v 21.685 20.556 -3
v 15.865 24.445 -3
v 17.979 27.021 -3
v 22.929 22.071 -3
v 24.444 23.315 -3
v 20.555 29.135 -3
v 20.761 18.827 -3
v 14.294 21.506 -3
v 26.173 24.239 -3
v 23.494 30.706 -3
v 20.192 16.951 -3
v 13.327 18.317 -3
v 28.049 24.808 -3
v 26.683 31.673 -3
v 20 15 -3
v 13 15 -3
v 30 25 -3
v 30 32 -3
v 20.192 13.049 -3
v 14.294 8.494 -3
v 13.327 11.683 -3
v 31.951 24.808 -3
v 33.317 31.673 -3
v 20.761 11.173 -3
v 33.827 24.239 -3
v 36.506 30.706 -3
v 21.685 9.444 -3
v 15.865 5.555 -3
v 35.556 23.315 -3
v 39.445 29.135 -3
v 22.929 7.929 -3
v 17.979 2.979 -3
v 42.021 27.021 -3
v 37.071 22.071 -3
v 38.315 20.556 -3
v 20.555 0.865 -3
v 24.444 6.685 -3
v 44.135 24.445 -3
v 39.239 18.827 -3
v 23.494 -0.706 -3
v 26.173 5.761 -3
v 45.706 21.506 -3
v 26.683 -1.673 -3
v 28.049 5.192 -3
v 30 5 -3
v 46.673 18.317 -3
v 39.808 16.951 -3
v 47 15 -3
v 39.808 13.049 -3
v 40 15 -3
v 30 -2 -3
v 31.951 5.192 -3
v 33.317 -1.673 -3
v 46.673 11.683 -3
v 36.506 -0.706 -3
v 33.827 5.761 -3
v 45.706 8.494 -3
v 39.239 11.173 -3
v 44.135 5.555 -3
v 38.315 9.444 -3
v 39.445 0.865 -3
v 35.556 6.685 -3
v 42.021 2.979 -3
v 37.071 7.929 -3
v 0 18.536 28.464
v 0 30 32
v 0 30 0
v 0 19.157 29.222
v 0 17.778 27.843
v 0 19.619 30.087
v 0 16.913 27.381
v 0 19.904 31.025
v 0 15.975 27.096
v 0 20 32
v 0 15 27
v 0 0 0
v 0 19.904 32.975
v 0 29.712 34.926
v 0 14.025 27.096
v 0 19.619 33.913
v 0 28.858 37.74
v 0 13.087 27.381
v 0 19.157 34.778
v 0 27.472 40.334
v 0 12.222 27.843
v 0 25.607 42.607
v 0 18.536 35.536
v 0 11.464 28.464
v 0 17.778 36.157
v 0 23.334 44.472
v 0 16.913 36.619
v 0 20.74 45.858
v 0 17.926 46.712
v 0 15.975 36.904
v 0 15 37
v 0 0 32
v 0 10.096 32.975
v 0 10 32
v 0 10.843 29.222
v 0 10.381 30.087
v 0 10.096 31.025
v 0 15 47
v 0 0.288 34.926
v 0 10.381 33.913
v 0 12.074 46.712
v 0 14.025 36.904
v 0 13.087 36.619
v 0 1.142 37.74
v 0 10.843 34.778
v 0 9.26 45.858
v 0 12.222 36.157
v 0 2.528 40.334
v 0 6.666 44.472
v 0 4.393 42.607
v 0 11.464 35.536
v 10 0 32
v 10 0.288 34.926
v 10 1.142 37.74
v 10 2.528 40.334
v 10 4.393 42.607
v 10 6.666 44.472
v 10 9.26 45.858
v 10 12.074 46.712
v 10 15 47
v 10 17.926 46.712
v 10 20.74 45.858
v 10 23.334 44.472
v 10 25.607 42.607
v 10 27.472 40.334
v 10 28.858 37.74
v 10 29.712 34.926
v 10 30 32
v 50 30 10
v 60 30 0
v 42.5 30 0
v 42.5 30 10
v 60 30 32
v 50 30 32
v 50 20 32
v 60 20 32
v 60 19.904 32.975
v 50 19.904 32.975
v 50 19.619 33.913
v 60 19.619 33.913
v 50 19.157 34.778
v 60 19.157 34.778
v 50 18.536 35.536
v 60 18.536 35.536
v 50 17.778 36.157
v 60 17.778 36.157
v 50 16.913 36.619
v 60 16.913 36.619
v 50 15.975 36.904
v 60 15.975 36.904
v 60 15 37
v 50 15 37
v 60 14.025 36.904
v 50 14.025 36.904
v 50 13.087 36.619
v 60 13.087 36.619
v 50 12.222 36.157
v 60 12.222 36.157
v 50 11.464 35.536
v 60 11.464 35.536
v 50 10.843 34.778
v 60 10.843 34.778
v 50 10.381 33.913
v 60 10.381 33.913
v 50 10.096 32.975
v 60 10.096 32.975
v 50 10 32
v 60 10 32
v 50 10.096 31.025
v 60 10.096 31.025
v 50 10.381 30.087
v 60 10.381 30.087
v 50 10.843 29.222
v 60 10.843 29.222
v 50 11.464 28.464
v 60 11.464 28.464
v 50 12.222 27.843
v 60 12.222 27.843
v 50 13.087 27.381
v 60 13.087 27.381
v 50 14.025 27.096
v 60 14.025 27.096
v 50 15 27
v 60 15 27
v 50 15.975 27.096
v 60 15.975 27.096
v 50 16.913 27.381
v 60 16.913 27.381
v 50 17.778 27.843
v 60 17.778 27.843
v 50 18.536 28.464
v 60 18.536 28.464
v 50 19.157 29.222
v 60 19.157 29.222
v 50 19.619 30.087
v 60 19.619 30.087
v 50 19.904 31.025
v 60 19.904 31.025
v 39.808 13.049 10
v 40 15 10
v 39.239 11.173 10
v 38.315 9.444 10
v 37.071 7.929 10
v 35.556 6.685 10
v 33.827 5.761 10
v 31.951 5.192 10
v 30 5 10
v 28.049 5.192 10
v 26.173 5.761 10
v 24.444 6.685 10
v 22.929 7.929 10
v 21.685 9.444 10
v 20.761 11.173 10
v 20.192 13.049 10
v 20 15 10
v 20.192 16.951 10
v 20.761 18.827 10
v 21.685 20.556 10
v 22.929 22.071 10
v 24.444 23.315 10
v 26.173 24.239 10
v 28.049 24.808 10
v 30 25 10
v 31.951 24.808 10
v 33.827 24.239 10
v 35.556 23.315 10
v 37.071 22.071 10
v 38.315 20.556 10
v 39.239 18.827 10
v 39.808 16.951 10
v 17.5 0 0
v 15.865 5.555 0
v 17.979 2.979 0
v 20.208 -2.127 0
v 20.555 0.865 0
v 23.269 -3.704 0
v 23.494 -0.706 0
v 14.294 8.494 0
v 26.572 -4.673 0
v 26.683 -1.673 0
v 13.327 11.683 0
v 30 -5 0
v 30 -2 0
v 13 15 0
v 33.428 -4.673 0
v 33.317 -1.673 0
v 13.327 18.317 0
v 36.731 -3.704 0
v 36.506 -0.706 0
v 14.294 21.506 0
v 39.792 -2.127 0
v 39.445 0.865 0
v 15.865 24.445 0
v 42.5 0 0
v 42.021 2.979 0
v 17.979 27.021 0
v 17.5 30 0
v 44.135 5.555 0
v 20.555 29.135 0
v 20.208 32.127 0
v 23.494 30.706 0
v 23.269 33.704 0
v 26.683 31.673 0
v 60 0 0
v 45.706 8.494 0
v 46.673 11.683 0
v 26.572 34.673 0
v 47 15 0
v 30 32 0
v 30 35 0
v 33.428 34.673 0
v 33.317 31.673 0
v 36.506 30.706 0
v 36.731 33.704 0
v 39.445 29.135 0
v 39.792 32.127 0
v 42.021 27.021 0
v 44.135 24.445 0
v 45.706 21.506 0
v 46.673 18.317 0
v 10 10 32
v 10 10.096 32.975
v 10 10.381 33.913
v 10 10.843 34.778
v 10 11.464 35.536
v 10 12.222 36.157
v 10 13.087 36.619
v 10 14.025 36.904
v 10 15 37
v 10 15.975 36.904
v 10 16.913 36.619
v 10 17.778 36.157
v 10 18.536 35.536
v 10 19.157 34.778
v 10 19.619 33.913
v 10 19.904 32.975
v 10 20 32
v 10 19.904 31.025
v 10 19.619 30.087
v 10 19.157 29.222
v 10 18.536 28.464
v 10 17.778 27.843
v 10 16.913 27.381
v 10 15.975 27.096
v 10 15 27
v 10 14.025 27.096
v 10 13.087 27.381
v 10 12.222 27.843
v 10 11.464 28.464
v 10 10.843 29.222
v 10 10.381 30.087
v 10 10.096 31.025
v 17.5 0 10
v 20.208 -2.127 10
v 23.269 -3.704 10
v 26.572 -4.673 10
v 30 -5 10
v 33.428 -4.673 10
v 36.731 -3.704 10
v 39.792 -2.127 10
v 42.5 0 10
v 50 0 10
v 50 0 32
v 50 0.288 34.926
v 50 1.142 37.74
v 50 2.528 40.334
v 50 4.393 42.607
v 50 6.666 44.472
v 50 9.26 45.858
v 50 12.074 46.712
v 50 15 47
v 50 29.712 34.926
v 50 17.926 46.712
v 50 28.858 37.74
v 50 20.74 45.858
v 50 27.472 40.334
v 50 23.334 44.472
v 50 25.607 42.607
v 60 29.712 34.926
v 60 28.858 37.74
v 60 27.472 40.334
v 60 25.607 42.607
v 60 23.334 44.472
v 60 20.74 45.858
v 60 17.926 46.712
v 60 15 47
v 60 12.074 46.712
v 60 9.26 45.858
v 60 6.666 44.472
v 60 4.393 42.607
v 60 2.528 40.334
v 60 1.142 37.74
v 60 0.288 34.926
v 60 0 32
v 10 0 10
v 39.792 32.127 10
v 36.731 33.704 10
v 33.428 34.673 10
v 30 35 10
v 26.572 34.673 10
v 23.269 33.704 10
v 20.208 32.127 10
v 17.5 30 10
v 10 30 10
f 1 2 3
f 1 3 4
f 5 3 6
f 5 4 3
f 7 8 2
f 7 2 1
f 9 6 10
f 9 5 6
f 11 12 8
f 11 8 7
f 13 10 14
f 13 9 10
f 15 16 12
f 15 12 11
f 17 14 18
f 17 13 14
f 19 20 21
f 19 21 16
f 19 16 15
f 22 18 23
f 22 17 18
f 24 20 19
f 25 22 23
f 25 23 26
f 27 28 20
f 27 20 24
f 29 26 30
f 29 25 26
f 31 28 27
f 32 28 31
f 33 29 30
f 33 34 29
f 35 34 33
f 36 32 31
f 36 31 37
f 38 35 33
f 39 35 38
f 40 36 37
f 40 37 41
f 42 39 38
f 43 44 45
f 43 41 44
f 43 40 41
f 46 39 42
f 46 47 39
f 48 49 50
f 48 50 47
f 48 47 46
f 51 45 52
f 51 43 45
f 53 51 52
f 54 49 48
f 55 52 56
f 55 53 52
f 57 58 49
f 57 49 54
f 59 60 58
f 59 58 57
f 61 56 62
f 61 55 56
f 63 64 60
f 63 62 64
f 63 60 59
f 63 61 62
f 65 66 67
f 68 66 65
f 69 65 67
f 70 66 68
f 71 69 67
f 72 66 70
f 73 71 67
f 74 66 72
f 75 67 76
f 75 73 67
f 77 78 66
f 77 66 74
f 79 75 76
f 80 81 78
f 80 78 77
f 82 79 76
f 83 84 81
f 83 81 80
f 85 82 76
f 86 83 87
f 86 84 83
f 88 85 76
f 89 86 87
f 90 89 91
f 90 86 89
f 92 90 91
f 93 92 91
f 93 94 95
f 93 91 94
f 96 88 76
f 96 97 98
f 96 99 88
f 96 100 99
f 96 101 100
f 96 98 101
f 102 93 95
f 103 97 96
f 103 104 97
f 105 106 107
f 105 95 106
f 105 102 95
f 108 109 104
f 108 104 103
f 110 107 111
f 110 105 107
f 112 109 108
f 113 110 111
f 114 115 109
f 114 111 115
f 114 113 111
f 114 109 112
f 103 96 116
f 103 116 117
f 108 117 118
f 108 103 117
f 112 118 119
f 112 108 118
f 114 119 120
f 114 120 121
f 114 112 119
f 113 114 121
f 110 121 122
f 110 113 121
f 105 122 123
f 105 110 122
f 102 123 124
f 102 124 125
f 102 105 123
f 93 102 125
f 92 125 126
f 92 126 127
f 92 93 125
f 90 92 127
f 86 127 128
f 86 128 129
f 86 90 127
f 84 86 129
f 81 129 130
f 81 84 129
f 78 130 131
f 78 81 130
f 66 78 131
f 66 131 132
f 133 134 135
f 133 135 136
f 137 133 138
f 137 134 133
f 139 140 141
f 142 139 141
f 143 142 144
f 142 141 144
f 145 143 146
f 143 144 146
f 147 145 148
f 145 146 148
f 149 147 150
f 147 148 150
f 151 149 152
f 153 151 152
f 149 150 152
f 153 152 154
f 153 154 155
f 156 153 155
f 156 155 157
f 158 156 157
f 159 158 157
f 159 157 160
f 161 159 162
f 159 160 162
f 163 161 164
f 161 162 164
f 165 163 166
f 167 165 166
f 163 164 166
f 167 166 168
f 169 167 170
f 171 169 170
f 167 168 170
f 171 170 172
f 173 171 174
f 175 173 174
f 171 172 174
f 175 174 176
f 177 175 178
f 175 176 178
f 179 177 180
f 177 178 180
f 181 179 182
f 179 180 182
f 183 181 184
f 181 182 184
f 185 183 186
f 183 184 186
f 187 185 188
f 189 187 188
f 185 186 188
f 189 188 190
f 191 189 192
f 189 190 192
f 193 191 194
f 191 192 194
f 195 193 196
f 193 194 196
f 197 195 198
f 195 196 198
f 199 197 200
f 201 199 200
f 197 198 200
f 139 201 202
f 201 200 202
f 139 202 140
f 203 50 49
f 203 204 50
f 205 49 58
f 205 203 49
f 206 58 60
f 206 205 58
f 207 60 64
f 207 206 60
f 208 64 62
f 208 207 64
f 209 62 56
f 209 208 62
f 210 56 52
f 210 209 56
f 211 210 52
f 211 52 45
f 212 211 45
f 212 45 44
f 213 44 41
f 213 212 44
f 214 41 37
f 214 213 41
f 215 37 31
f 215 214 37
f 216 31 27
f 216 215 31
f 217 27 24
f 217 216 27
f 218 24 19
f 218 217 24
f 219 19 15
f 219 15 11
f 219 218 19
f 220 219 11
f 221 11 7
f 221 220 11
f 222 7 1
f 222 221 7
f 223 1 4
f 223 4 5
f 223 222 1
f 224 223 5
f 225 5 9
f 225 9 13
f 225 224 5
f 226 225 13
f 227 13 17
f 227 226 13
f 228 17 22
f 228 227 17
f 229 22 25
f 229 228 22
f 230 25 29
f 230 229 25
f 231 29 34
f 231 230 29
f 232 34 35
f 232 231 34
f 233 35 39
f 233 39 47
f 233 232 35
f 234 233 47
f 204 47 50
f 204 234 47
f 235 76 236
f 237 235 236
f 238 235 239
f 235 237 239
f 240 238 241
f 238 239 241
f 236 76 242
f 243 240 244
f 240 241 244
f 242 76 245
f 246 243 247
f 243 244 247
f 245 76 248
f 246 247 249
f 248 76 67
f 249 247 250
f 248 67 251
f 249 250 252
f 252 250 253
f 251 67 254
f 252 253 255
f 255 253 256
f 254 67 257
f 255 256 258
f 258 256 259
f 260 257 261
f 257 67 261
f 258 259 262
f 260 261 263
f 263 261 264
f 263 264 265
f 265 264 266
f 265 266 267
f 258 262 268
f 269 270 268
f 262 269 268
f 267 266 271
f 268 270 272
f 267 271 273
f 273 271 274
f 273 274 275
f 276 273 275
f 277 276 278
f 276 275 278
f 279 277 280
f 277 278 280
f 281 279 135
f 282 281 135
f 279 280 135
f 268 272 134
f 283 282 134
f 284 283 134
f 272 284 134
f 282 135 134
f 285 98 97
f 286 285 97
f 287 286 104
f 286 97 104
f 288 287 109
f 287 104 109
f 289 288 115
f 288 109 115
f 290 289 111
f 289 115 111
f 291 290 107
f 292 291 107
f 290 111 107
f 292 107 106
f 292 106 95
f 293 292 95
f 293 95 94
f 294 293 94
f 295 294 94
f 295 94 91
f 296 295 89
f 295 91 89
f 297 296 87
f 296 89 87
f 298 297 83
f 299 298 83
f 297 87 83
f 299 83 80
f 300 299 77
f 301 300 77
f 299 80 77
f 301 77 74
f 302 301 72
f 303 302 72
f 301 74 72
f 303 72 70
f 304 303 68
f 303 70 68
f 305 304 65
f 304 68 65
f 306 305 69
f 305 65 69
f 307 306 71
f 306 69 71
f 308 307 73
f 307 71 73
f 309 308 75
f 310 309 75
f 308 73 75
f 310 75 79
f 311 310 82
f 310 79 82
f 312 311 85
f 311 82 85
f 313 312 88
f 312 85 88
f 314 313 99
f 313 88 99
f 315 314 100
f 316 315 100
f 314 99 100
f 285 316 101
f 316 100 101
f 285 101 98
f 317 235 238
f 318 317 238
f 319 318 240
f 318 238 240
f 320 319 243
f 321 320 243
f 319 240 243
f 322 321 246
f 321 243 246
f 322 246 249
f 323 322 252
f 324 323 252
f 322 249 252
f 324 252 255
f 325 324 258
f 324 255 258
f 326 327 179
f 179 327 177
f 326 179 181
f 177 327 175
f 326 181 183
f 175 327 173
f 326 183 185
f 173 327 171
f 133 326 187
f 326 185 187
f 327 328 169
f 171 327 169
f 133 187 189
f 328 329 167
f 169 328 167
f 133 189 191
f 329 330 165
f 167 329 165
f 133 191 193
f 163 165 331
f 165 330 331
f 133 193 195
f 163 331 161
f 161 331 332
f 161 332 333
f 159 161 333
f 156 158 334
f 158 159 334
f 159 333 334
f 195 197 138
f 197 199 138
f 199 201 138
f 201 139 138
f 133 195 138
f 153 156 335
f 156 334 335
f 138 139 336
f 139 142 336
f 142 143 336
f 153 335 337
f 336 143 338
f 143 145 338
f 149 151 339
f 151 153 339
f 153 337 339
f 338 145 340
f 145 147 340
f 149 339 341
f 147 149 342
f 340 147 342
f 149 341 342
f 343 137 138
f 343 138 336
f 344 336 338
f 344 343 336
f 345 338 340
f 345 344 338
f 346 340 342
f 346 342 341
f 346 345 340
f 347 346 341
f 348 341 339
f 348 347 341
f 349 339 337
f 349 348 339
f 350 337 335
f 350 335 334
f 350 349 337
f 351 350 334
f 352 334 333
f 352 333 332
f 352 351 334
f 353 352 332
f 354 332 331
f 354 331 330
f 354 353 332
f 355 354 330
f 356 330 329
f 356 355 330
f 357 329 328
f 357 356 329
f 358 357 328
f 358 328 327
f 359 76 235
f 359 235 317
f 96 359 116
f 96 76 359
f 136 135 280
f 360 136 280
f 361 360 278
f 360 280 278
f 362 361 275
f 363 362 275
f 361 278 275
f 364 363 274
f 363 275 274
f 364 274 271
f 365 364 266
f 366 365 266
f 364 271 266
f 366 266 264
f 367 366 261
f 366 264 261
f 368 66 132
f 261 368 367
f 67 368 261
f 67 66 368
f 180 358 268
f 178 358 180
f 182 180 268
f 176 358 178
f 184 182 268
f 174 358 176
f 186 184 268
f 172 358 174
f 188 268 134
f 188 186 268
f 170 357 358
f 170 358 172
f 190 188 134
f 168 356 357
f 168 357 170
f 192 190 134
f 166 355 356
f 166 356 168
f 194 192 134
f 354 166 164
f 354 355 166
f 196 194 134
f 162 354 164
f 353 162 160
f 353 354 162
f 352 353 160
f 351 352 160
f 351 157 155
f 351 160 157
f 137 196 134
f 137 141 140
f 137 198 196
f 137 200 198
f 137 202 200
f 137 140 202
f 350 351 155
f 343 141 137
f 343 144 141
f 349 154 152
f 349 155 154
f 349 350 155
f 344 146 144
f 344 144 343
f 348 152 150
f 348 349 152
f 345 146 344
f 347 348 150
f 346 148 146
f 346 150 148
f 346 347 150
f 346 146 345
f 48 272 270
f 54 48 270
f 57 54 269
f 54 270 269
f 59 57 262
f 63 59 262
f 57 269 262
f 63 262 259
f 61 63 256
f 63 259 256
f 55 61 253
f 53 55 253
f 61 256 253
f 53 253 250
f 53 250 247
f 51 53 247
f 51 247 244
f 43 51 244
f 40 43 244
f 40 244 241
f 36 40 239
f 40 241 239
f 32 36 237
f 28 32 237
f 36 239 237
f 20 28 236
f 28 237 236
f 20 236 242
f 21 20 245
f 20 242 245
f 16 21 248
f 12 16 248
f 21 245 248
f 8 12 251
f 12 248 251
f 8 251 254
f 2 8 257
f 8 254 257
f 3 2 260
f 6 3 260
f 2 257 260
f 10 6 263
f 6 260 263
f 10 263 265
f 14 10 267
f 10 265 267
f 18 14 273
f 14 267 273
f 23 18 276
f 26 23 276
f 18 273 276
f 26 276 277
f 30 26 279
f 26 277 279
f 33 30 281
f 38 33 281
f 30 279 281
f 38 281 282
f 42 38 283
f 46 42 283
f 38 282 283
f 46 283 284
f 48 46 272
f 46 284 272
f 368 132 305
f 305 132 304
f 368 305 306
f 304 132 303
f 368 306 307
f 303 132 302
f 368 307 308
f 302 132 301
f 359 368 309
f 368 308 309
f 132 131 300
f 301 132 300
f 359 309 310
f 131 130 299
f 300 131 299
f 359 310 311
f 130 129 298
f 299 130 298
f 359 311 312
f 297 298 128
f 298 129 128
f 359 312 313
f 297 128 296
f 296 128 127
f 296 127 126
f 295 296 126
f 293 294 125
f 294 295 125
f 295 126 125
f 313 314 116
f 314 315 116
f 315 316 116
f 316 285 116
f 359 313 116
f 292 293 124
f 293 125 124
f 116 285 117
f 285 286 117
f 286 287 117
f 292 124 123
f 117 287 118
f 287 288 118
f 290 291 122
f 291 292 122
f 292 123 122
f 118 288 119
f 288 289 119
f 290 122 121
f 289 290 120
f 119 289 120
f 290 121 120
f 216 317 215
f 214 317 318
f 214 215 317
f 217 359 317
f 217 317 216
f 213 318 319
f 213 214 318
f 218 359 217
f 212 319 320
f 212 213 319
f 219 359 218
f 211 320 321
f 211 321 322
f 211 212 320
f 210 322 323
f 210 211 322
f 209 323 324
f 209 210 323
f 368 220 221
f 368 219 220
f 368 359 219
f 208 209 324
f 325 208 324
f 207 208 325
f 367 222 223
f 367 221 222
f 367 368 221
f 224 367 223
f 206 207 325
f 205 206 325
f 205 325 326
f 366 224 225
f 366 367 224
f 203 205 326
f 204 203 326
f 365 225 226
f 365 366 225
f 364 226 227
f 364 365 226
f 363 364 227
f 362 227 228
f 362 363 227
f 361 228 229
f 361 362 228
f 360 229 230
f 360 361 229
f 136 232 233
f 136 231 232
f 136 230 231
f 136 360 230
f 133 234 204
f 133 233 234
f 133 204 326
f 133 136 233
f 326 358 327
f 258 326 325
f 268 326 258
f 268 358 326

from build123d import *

# Parameters (mm, degrees)
F1_DEPTH  = 10
F2_R      = 10
F3_DEPTH  = 10.001
F4_R      = 17
F4_R_2    = 10
F5_DEPTH  = 3
F7_R      = 5
F8_DEPTH  = 10
F9_R      = 5
F10_DEPTH = 10


with BuildPart() as f1:
    # F0 (on Top) → F1 (new body)
    with BuildSketch(Plane.XY):
        with BuildLine():
            Line((42.5, 0), (17.5, 0))
            ThreePointArc((17.5, 0), (30, -5), (42.5, 0))
        make_face()
        with BuildLine():
            Line((0, 30), (0, 0))
            Line((0, 0), (17.5, 0))
            Line((17.5, 0), (42.5, 0))
            Line((42.5, 0), (60, 0))
            Line((60, 0), (60, 30))
            Line((60, 30), (42.5, 30))
            ThreePointArc((42.5, 30), (30, 35), (17.5, 30))
            Line((17.5, 30), (0, 30))
        make_face()
    extrude(amount=F1_DEPTH)

    # F2 (on face) → F3 (cut, through all)
    with BuildSketch(Plane.XY.offset(10)):
        with Locations((30, 15)):
            Circle(F2_R)
    extrude(amount=-F3_DEPTH, mode=Mode.SUBTRACT)

    # F4 (on face) → F5 (join)
    with BuildSketch(Plane(origin=(0, 0, 0), x_dir=(1, 0, 0), z_dir=(0, 0, -1))):
        with Locations((30, -15)):
            Circle(F4_R)
        with Locations((30, -15)):
            Circle(F4_R_2, mode=Mode.SUBTRACT)
    extrude(amount=F5_DEPTH)

    # F7 (on face) → F8 (join)
    with BuildSketch(Plane.YZ.offset(60)):
        with BuildLine():
            Line((30, 10), (30, 32))
            ThreePointArc((30, 32), (15, 17), (0, 32))
            Line((0, 32), (0, 10))
            Line((0, 10), (30, 10))
        make_face()
        with BuildLine():
            ThreePointArc((0, 32), (15, 17), (30, 32))
            ThreePointArc((30, 32), (15, 47), (0, 32))
        make_face()
        with Locations((15, 32)):
            Circle(F7_R, mode=Mode.SUBTRACT)
    extrude(amount=-F8_DEPTH)

    # F9 (on face) → F10 (join)
    with BuildSketch(Plane(origin=(0, 0, 0), x_dir=(0, -1, 0), z_dir=(-1, 0, 0))):
        with BuildLine():
            Line((0, 10), (0, 32))
            ThreePointArc((0, 32), (-15, 17), (-30, 32))
            Line((-30, 32), (-30, 10))
            Line((-30, 10), (0, 10))
        make_face()
        with BuildLine():
            ThreePointArc((-30, 32), (-15, 17), (0, 32))
            ThreePointArc((0, 32), (-15, 47), (-30, 32))
        make_face()
        with Locations((-15, 32)):
            Circle(F9_R, mode=Mode.SUBTRACT)
    extrude(amount=-F10_DEPTH)


solid = f1.part
